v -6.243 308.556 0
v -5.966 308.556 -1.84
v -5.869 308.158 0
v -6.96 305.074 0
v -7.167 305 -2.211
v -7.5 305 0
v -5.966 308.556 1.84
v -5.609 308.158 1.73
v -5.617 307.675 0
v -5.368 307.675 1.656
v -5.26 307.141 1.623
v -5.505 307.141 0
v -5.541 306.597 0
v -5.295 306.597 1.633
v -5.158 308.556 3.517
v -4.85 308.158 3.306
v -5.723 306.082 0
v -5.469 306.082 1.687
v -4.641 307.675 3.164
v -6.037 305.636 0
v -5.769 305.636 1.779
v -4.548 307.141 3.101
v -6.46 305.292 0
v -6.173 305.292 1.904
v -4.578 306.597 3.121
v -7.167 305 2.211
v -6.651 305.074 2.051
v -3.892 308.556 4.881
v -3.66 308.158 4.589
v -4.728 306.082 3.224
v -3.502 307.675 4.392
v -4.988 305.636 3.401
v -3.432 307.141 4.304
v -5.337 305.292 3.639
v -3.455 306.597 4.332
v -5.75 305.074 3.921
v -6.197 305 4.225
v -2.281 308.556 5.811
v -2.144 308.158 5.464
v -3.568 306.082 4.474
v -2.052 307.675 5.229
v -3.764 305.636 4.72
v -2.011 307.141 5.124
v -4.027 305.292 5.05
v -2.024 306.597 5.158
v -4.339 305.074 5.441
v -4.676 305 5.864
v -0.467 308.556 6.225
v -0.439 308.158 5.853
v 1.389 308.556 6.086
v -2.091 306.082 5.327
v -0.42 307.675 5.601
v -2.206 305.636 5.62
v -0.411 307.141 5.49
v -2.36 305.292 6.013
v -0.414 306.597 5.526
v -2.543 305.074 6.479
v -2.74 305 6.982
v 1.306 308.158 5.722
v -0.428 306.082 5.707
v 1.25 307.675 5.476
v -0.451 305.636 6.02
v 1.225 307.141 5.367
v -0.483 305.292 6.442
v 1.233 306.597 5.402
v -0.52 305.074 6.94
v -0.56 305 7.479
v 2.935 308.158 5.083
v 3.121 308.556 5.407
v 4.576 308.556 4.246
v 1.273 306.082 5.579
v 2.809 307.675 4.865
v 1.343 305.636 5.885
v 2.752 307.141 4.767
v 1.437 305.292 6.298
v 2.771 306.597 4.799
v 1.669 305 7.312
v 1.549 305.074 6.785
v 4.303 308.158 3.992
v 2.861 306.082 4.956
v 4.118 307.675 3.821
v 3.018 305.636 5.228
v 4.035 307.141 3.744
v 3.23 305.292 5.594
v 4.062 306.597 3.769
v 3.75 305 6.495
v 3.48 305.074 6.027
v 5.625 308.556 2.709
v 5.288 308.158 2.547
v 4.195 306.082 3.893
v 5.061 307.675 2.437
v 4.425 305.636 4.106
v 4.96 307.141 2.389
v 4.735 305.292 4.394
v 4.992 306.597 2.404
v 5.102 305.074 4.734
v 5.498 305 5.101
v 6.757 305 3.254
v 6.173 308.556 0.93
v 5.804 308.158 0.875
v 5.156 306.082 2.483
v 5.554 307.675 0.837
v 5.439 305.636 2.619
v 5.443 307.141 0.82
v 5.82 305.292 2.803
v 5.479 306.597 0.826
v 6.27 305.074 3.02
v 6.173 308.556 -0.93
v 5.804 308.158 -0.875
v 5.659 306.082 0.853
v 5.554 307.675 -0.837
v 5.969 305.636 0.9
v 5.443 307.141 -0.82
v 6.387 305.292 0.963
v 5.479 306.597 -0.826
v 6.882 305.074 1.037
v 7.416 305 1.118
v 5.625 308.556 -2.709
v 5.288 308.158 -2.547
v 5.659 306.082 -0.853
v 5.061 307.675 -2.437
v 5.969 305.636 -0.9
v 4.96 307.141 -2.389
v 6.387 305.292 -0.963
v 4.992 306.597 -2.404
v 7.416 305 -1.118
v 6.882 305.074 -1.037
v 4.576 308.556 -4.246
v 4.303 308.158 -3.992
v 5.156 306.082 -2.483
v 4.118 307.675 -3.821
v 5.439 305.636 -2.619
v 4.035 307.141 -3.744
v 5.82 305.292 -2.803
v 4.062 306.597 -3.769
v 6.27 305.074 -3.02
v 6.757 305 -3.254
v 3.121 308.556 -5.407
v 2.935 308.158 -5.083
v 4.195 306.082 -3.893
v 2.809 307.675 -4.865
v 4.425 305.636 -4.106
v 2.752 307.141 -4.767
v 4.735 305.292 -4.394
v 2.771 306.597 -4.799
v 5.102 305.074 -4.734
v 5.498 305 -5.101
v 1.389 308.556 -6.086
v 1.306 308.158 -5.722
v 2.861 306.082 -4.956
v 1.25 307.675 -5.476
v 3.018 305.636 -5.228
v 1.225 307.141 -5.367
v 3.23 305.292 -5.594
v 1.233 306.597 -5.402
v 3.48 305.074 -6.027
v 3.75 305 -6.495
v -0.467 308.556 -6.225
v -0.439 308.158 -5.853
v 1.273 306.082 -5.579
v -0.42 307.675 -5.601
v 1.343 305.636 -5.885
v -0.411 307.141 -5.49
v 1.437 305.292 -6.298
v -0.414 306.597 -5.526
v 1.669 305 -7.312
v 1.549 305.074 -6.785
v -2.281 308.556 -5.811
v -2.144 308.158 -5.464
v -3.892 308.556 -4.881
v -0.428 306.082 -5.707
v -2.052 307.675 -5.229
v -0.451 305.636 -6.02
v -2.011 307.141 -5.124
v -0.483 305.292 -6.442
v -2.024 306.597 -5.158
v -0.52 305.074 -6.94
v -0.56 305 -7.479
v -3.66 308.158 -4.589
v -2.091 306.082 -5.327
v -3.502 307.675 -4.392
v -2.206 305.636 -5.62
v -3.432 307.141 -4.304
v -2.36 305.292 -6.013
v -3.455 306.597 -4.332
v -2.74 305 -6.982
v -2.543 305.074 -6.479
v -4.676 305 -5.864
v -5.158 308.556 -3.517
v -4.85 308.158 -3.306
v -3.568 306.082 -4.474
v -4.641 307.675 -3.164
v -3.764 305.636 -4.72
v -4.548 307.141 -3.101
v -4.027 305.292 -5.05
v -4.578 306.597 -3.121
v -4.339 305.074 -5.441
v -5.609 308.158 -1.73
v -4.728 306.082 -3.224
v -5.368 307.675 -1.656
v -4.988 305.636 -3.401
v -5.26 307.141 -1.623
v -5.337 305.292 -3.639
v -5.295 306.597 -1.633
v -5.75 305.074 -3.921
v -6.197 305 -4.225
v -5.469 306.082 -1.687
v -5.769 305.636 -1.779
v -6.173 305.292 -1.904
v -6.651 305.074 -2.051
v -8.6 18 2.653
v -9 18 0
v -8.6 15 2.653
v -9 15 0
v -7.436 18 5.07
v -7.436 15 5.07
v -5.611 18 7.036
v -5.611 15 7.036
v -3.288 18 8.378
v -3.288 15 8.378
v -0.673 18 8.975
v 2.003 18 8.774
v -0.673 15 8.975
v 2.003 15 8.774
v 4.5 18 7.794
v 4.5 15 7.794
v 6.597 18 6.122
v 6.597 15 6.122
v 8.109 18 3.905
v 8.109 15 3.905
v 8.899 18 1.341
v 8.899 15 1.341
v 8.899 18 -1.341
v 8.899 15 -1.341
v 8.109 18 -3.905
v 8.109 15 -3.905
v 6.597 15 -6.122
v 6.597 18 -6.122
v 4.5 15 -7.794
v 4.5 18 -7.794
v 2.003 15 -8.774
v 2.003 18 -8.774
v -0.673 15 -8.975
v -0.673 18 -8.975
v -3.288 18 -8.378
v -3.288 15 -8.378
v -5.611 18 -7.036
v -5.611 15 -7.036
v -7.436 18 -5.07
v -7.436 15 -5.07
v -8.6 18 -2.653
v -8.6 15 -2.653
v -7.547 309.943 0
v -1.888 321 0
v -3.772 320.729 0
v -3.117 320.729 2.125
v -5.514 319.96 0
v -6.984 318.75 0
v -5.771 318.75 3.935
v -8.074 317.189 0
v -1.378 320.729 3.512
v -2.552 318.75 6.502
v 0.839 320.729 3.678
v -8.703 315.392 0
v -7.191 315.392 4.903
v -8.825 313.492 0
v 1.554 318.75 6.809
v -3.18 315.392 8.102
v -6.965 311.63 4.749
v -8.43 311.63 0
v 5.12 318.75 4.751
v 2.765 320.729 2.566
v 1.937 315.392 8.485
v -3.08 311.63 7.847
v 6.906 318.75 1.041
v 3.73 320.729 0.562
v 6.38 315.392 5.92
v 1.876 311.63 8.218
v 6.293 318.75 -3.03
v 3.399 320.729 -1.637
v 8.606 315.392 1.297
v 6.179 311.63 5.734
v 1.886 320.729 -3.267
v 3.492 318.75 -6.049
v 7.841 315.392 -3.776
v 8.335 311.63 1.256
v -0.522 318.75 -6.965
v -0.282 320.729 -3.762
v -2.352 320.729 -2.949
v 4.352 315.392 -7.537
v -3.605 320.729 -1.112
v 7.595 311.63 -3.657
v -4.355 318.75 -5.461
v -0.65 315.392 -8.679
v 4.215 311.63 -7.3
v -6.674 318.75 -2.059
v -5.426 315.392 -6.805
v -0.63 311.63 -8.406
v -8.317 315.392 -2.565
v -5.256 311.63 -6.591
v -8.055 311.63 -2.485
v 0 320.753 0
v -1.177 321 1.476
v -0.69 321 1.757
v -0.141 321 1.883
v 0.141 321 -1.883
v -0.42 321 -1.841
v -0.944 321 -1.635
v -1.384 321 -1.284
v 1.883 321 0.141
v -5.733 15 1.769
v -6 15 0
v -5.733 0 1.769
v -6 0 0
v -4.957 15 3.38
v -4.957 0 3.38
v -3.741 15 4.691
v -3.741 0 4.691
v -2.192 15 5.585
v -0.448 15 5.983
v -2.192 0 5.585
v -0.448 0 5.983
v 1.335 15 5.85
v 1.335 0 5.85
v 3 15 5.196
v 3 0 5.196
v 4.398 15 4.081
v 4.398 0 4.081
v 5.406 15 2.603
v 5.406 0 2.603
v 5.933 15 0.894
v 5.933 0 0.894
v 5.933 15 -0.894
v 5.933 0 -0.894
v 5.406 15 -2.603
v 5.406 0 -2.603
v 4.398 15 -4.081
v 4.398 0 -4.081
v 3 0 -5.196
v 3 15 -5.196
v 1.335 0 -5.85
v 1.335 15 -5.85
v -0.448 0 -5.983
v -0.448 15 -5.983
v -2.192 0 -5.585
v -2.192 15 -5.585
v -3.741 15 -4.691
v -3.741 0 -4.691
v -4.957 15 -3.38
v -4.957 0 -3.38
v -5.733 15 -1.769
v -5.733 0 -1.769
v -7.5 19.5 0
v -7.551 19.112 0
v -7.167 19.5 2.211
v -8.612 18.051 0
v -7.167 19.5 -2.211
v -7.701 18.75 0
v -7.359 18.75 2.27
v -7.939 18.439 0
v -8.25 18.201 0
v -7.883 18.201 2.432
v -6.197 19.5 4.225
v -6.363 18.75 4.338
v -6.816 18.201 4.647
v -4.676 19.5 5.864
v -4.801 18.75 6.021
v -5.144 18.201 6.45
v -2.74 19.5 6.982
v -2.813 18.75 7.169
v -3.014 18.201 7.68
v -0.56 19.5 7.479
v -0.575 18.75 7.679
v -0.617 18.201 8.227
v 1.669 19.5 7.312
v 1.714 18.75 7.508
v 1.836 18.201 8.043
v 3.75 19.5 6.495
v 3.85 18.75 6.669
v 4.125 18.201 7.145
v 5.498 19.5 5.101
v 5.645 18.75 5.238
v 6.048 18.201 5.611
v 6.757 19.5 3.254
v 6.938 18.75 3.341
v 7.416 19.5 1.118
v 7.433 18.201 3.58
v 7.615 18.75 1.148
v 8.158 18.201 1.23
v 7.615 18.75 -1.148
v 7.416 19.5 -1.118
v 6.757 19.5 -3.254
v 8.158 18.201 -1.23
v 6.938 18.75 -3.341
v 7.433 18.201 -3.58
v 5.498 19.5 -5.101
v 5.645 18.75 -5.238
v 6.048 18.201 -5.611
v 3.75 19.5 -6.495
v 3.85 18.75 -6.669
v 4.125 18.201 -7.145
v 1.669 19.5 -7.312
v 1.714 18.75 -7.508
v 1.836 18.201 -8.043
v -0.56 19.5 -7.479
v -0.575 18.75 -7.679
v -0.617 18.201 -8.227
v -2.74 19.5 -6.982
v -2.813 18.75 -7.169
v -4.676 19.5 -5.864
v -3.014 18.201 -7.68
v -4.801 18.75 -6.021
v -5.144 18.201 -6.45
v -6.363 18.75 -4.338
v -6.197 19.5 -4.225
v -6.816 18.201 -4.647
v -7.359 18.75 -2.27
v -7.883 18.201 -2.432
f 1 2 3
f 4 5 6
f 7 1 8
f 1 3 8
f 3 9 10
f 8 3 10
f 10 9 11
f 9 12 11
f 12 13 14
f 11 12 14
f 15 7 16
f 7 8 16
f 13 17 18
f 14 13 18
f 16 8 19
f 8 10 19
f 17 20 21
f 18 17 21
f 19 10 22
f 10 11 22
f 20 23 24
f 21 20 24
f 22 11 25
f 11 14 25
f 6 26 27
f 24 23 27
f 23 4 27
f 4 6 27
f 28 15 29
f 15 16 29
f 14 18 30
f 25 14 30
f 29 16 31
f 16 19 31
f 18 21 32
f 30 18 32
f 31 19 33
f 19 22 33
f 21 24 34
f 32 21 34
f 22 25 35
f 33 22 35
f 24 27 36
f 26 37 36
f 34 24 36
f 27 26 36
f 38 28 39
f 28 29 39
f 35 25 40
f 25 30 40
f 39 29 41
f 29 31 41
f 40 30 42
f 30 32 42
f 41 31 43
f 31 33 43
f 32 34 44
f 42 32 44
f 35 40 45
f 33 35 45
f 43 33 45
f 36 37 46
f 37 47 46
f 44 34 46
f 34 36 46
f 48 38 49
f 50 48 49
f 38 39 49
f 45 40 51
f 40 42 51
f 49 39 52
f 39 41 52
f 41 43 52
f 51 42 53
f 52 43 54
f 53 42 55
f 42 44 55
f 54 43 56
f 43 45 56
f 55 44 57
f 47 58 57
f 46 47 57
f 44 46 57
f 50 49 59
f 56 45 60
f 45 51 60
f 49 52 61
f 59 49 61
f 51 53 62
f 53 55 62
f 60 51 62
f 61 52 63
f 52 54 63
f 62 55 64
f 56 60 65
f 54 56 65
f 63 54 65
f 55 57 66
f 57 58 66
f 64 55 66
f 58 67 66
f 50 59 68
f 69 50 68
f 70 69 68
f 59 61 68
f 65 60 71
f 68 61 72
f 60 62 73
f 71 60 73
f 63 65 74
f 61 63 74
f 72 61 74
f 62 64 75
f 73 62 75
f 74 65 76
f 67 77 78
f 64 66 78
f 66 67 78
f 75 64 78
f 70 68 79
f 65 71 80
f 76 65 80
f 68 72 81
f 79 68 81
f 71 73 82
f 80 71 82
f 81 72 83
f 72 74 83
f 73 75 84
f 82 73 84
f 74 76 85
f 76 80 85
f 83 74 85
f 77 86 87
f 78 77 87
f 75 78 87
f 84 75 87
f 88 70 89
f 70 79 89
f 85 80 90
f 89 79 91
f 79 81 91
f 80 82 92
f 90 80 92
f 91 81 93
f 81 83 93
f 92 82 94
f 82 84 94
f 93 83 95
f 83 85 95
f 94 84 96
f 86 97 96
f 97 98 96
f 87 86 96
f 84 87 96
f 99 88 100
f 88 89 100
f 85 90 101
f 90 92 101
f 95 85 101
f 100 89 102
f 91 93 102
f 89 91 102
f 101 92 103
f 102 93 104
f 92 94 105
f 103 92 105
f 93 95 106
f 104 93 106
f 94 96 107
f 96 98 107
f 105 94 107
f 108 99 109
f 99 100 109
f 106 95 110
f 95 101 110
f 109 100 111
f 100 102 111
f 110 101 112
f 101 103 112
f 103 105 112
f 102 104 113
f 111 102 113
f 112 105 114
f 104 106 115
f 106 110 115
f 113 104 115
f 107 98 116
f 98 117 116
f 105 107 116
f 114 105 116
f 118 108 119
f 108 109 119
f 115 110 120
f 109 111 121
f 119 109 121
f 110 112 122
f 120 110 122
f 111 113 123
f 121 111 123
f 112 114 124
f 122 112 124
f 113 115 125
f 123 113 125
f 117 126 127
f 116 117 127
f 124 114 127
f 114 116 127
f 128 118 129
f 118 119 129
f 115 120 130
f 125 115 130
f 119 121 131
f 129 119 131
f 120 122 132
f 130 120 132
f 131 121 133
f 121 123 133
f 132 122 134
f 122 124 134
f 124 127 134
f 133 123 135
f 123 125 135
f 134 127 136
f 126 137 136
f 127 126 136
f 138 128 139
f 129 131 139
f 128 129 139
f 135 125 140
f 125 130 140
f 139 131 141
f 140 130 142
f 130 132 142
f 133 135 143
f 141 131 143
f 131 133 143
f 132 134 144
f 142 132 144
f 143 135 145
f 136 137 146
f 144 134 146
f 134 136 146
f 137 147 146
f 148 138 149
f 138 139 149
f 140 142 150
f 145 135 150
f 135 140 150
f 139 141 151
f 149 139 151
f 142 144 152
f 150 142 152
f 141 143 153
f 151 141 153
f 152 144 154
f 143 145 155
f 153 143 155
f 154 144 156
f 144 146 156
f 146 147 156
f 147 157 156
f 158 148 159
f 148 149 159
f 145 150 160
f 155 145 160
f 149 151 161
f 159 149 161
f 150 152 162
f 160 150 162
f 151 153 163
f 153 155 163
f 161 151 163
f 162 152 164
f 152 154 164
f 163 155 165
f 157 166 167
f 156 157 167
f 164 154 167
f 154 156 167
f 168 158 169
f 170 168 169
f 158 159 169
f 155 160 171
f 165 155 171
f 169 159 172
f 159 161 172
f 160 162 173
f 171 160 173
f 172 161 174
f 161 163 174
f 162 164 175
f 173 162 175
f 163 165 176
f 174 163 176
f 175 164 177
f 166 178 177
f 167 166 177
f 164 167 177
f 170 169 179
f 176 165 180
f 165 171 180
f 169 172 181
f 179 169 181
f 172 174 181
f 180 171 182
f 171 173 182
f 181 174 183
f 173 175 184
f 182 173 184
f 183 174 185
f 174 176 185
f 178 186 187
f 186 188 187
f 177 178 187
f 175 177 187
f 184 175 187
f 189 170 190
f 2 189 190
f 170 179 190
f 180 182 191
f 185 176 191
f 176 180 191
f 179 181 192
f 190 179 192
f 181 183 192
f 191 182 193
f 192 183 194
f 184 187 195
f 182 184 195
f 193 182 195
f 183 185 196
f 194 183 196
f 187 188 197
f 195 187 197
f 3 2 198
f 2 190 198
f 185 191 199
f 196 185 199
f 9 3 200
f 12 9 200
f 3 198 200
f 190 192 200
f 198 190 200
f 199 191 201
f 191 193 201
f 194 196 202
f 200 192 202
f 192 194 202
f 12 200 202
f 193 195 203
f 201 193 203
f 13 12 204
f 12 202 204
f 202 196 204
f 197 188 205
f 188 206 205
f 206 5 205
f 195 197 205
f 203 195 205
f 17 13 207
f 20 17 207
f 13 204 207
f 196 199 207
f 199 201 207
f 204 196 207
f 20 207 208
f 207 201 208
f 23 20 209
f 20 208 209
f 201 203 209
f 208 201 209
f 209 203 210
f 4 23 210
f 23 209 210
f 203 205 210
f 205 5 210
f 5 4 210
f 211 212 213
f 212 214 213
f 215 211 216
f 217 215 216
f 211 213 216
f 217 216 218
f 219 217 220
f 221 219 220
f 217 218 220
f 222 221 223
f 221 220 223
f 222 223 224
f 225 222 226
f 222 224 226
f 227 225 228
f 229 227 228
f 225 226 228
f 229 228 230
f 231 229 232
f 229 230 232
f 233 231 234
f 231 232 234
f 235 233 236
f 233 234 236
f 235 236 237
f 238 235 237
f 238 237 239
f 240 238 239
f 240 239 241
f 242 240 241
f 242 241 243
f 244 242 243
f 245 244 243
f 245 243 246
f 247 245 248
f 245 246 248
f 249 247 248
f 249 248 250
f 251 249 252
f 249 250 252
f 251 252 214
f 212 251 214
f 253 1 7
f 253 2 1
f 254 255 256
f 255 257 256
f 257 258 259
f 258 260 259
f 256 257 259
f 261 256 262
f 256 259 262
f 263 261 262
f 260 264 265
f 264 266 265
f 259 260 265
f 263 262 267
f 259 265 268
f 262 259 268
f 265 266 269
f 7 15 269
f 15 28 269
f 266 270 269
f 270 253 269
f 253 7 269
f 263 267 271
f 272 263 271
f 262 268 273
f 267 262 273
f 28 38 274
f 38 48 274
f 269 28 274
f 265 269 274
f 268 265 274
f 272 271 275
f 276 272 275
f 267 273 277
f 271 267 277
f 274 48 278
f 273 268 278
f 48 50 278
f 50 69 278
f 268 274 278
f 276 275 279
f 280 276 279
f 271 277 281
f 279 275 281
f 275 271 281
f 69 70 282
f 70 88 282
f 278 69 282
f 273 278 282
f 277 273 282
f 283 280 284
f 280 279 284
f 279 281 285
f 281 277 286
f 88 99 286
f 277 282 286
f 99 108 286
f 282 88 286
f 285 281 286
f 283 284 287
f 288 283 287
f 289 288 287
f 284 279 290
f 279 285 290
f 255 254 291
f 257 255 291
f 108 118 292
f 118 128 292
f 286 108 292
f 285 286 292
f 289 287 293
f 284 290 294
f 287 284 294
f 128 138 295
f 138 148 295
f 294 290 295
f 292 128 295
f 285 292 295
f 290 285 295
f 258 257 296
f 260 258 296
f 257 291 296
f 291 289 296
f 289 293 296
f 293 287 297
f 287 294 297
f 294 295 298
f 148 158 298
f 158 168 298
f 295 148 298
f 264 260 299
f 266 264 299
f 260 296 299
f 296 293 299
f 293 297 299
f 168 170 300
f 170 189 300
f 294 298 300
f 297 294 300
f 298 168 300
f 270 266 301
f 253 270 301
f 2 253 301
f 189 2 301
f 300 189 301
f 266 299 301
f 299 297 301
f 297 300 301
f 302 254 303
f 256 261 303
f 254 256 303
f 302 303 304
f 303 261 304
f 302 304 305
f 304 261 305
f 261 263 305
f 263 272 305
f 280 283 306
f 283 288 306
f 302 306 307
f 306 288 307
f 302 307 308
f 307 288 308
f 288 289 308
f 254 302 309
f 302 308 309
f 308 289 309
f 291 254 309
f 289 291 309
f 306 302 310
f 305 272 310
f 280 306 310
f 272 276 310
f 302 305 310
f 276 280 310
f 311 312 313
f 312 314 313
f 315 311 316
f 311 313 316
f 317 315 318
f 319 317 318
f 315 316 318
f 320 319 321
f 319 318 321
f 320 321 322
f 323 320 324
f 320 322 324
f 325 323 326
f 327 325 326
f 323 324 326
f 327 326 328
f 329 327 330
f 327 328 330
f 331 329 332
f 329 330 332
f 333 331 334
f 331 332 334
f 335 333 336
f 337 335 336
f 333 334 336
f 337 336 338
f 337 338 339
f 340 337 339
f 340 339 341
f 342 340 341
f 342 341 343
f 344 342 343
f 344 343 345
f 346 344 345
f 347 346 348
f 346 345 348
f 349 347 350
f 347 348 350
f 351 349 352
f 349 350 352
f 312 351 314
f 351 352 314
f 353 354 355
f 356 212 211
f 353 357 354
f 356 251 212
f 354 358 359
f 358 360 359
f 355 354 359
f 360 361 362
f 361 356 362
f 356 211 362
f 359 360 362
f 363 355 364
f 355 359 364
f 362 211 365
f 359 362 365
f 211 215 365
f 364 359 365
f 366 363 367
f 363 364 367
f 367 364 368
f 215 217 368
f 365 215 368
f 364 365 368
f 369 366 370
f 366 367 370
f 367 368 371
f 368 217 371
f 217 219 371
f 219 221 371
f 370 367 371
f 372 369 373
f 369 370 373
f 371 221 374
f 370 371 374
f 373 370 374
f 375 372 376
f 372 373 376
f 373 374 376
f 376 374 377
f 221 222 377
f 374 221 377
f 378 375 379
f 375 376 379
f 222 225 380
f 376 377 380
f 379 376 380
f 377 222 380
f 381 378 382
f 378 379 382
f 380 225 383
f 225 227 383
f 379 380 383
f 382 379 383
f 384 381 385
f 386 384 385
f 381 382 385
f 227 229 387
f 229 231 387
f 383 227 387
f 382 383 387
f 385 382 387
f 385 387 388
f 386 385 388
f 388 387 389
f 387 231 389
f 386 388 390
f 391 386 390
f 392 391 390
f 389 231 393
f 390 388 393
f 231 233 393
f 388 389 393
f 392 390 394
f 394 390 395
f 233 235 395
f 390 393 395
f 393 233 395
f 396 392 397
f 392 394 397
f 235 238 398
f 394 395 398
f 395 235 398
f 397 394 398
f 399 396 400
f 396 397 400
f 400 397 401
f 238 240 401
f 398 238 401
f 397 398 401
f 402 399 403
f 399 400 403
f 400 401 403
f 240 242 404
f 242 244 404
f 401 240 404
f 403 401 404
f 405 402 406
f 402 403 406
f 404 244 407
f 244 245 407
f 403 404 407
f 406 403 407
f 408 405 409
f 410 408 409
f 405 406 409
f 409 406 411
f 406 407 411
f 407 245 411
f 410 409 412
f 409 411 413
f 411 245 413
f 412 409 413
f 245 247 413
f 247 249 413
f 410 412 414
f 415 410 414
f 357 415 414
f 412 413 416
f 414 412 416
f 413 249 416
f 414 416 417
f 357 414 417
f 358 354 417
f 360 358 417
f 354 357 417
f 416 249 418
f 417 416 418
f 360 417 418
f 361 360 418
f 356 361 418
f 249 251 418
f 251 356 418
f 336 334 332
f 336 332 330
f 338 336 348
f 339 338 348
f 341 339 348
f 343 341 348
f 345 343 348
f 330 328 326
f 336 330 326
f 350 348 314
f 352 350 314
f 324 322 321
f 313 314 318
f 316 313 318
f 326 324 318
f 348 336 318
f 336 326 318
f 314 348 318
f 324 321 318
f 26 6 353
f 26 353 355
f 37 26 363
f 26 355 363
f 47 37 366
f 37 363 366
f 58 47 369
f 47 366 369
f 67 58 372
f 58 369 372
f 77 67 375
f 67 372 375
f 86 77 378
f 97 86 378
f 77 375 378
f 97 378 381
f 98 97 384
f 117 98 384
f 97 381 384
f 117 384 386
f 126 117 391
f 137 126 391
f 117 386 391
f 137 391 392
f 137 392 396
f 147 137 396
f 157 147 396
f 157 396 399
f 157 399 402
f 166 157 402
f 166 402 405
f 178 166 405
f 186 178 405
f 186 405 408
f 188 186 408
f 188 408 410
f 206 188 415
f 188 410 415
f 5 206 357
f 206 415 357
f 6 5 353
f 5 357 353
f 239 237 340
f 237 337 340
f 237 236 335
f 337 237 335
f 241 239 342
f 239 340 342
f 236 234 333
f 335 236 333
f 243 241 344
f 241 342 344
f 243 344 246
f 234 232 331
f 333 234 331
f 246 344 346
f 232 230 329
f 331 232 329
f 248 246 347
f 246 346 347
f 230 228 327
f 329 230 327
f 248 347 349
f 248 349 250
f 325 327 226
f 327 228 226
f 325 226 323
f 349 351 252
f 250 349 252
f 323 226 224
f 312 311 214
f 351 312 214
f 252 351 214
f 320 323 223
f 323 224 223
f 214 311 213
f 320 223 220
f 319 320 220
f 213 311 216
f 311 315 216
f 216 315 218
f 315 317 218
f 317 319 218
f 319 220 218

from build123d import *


with BuildPart() as part:
    # Sketch1 → Revolve1 (revolve)
    with BuildSketch(Plane.XY):
        with BuildLine():
            Line((-6, 0), (0, 0))
            Line((0, 0), (0, 320.752985543))
            ThreePointArc((0, 320.752985543), (-8.074390693, 317.189292472), (-6.242921278, 308.555555556))
            ThreePointArc((-6.242921278, 308.555555556), (-5.614381917, 306.333333333), (-7.5, 305))
            Line((-7.5, 305), (-7.5, 19.5))
            ThreePointArc((-7.5, 19.5), (-7.939339828, 18.439339828), (-9, 18))
            Line((-9, 18), (-9, 15))
            Line((-9, 15), (-6, 15))
            Line((-6, 15), (-6, 0))
        make_face()
    revolve(axis=Axis((0, 0, 0), (0, 1, 0)))


solid = part.part
